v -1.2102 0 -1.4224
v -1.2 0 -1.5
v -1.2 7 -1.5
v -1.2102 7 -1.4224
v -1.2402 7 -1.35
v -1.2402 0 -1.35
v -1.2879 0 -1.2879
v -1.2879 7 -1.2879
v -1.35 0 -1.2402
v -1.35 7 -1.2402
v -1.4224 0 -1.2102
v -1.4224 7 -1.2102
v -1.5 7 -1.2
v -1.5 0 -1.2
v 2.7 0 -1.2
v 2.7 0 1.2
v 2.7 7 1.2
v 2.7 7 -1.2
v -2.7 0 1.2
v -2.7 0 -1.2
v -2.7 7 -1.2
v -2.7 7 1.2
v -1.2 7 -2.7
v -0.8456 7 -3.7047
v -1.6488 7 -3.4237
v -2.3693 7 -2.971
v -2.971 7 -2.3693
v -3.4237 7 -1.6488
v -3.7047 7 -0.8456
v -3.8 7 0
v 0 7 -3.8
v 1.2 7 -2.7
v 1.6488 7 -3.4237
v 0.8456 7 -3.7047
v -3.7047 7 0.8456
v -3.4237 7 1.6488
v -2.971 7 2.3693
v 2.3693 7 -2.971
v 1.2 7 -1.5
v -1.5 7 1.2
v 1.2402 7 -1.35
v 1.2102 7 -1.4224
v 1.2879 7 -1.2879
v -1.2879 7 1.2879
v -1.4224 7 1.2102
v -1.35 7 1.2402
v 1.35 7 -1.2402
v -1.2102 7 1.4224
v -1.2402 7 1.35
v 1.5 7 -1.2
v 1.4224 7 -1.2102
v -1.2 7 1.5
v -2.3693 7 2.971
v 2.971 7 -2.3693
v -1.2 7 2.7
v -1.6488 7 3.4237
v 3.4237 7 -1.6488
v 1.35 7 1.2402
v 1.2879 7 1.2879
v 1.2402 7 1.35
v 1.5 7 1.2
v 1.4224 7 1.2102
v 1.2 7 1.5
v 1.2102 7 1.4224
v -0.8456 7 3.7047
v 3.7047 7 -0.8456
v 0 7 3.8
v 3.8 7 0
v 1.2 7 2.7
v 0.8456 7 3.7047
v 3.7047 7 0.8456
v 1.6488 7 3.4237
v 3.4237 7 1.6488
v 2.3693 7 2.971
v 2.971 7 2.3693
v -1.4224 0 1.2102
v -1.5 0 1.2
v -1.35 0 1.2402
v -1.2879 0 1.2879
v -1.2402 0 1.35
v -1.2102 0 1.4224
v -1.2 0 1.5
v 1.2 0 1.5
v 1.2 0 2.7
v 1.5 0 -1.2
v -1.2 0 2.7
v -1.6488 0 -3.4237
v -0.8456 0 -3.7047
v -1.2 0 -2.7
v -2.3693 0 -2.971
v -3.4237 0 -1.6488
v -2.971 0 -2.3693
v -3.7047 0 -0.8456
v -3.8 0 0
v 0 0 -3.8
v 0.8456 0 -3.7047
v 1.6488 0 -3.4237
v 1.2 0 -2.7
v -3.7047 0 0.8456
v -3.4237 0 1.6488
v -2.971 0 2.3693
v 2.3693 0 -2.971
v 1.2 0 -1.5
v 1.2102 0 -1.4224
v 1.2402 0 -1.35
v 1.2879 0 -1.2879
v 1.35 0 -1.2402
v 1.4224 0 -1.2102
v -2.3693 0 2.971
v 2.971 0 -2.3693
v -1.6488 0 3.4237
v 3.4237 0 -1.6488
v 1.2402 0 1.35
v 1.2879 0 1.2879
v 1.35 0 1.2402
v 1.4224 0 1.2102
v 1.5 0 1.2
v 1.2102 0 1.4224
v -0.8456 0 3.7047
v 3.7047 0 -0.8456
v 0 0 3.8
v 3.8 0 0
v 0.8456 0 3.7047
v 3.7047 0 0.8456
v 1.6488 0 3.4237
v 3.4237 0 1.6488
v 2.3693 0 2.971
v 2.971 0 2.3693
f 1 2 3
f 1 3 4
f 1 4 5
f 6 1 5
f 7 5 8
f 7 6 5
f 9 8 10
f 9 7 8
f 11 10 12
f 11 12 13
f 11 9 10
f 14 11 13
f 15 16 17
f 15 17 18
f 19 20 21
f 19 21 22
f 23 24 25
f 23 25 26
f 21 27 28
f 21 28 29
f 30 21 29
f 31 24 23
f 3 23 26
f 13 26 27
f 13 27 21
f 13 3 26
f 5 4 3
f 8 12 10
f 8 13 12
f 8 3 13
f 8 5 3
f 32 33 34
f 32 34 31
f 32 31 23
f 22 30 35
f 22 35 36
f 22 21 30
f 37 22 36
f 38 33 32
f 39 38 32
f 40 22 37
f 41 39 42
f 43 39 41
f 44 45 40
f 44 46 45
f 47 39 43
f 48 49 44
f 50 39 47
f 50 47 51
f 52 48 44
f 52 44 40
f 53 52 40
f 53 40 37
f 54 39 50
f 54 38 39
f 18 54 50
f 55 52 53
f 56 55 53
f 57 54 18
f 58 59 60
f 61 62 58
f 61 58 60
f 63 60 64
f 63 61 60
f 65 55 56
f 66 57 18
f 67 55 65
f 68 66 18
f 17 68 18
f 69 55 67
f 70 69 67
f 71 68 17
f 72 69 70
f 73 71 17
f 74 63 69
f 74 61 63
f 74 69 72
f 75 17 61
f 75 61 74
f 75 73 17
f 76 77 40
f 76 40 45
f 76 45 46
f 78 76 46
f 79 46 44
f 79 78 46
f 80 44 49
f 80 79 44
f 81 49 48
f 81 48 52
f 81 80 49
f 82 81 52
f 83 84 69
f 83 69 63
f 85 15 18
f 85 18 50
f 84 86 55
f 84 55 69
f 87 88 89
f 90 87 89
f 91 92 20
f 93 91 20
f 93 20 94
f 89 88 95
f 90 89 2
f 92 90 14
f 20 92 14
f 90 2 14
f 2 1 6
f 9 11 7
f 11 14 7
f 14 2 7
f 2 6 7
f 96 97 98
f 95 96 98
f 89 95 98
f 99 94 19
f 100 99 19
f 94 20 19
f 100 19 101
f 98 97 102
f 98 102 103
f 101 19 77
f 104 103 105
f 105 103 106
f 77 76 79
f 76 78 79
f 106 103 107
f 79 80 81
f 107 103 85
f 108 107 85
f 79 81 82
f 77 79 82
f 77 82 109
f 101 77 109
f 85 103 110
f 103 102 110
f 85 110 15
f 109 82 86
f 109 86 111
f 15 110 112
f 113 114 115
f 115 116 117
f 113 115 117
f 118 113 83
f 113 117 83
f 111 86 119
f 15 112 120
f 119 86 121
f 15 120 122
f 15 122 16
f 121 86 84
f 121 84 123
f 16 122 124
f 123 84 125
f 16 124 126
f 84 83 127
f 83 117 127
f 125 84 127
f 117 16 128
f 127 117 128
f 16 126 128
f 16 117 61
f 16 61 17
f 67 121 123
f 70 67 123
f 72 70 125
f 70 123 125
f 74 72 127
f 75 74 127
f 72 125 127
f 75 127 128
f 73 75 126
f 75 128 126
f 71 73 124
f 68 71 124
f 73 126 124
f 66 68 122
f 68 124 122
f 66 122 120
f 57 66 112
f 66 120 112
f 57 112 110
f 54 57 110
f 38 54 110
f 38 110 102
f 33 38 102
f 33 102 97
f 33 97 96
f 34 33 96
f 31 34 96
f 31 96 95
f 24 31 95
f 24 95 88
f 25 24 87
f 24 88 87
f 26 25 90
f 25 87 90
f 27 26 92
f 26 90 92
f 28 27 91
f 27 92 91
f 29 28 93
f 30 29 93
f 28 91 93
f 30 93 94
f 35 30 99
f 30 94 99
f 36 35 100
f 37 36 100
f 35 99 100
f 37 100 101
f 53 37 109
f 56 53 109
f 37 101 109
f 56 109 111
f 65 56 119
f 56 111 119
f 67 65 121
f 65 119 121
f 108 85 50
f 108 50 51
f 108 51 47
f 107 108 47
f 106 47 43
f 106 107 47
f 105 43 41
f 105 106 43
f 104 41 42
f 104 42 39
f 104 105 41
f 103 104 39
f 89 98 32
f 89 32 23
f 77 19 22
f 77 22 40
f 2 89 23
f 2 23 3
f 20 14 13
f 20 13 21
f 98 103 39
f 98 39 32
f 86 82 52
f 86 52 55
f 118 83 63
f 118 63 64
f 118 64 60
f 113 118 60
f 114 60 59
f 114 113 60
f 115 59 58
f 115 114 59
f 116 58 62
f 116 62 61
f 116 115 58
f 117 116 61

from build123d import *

# Parameters (mm, degrees)
SKETCH1_R           = 3.8
BOSS_EXTRUDE1_DEPTH = 7


with BuildPart() as part:
    # Sketch1 → Boss-Extrude1 (new body)
    with BuildSketch(Plane(origin=(0, 0, 0), x_dir=(1, 0, 0), z_dir=(0, 1, 0))):
        with Locations(Location((0, 0, 0), (0, 0, 270))):
            Circle(SKETCH1_R)
        with BuildLine():
            Line((1.5, -1.2), (2.7, -1.2))
            Line((2.7, -1.2), (2.7, 1.2))
            Line((2.7, 1.2), (1.5, 1.2))
            ThreePointArc((1.5, 1.2), (1.287867966, 1.287867966), (1.2, 1.5))
            Line((1.2, 1.5), (1.2, 2.7))
            Line((1.2, 2.7), (-1.2, 2.7))
            Line((-1.2, 2.7), (-1.2, 1.5))
            ThreePointArc((-1.2, 1.5), (-1.287867966, 1.287867966), (-1.5, 1.2))
            Line((-1.5, 1.2), (-2.7, 1.2))
            Line((-2.7, 1.2), (-2.7, -1.2))
            Line((-2.7, -1.2), (-1.5, -1.2))
            ThreePointArc((-1.5, -1.2), (-1.287867966, -1.287867966), (-1.2, -1.5))
            Line((-1.2, -1.5), (-1.2, -2.7))
            Line((-1.2, -2.7), (1.2, -2.7))
            Line((1.2, -2.7), (1.2, -1.5))
            ThreePointArc((1.2, -1.5), (1.287867966, -1.287867966), (1.5, -1.2))
        make_face(mode=Mode.SUBTRACT)
    extrude(amount=BOSS_EXTRUDE1_DEPTH)


solid = part.part
